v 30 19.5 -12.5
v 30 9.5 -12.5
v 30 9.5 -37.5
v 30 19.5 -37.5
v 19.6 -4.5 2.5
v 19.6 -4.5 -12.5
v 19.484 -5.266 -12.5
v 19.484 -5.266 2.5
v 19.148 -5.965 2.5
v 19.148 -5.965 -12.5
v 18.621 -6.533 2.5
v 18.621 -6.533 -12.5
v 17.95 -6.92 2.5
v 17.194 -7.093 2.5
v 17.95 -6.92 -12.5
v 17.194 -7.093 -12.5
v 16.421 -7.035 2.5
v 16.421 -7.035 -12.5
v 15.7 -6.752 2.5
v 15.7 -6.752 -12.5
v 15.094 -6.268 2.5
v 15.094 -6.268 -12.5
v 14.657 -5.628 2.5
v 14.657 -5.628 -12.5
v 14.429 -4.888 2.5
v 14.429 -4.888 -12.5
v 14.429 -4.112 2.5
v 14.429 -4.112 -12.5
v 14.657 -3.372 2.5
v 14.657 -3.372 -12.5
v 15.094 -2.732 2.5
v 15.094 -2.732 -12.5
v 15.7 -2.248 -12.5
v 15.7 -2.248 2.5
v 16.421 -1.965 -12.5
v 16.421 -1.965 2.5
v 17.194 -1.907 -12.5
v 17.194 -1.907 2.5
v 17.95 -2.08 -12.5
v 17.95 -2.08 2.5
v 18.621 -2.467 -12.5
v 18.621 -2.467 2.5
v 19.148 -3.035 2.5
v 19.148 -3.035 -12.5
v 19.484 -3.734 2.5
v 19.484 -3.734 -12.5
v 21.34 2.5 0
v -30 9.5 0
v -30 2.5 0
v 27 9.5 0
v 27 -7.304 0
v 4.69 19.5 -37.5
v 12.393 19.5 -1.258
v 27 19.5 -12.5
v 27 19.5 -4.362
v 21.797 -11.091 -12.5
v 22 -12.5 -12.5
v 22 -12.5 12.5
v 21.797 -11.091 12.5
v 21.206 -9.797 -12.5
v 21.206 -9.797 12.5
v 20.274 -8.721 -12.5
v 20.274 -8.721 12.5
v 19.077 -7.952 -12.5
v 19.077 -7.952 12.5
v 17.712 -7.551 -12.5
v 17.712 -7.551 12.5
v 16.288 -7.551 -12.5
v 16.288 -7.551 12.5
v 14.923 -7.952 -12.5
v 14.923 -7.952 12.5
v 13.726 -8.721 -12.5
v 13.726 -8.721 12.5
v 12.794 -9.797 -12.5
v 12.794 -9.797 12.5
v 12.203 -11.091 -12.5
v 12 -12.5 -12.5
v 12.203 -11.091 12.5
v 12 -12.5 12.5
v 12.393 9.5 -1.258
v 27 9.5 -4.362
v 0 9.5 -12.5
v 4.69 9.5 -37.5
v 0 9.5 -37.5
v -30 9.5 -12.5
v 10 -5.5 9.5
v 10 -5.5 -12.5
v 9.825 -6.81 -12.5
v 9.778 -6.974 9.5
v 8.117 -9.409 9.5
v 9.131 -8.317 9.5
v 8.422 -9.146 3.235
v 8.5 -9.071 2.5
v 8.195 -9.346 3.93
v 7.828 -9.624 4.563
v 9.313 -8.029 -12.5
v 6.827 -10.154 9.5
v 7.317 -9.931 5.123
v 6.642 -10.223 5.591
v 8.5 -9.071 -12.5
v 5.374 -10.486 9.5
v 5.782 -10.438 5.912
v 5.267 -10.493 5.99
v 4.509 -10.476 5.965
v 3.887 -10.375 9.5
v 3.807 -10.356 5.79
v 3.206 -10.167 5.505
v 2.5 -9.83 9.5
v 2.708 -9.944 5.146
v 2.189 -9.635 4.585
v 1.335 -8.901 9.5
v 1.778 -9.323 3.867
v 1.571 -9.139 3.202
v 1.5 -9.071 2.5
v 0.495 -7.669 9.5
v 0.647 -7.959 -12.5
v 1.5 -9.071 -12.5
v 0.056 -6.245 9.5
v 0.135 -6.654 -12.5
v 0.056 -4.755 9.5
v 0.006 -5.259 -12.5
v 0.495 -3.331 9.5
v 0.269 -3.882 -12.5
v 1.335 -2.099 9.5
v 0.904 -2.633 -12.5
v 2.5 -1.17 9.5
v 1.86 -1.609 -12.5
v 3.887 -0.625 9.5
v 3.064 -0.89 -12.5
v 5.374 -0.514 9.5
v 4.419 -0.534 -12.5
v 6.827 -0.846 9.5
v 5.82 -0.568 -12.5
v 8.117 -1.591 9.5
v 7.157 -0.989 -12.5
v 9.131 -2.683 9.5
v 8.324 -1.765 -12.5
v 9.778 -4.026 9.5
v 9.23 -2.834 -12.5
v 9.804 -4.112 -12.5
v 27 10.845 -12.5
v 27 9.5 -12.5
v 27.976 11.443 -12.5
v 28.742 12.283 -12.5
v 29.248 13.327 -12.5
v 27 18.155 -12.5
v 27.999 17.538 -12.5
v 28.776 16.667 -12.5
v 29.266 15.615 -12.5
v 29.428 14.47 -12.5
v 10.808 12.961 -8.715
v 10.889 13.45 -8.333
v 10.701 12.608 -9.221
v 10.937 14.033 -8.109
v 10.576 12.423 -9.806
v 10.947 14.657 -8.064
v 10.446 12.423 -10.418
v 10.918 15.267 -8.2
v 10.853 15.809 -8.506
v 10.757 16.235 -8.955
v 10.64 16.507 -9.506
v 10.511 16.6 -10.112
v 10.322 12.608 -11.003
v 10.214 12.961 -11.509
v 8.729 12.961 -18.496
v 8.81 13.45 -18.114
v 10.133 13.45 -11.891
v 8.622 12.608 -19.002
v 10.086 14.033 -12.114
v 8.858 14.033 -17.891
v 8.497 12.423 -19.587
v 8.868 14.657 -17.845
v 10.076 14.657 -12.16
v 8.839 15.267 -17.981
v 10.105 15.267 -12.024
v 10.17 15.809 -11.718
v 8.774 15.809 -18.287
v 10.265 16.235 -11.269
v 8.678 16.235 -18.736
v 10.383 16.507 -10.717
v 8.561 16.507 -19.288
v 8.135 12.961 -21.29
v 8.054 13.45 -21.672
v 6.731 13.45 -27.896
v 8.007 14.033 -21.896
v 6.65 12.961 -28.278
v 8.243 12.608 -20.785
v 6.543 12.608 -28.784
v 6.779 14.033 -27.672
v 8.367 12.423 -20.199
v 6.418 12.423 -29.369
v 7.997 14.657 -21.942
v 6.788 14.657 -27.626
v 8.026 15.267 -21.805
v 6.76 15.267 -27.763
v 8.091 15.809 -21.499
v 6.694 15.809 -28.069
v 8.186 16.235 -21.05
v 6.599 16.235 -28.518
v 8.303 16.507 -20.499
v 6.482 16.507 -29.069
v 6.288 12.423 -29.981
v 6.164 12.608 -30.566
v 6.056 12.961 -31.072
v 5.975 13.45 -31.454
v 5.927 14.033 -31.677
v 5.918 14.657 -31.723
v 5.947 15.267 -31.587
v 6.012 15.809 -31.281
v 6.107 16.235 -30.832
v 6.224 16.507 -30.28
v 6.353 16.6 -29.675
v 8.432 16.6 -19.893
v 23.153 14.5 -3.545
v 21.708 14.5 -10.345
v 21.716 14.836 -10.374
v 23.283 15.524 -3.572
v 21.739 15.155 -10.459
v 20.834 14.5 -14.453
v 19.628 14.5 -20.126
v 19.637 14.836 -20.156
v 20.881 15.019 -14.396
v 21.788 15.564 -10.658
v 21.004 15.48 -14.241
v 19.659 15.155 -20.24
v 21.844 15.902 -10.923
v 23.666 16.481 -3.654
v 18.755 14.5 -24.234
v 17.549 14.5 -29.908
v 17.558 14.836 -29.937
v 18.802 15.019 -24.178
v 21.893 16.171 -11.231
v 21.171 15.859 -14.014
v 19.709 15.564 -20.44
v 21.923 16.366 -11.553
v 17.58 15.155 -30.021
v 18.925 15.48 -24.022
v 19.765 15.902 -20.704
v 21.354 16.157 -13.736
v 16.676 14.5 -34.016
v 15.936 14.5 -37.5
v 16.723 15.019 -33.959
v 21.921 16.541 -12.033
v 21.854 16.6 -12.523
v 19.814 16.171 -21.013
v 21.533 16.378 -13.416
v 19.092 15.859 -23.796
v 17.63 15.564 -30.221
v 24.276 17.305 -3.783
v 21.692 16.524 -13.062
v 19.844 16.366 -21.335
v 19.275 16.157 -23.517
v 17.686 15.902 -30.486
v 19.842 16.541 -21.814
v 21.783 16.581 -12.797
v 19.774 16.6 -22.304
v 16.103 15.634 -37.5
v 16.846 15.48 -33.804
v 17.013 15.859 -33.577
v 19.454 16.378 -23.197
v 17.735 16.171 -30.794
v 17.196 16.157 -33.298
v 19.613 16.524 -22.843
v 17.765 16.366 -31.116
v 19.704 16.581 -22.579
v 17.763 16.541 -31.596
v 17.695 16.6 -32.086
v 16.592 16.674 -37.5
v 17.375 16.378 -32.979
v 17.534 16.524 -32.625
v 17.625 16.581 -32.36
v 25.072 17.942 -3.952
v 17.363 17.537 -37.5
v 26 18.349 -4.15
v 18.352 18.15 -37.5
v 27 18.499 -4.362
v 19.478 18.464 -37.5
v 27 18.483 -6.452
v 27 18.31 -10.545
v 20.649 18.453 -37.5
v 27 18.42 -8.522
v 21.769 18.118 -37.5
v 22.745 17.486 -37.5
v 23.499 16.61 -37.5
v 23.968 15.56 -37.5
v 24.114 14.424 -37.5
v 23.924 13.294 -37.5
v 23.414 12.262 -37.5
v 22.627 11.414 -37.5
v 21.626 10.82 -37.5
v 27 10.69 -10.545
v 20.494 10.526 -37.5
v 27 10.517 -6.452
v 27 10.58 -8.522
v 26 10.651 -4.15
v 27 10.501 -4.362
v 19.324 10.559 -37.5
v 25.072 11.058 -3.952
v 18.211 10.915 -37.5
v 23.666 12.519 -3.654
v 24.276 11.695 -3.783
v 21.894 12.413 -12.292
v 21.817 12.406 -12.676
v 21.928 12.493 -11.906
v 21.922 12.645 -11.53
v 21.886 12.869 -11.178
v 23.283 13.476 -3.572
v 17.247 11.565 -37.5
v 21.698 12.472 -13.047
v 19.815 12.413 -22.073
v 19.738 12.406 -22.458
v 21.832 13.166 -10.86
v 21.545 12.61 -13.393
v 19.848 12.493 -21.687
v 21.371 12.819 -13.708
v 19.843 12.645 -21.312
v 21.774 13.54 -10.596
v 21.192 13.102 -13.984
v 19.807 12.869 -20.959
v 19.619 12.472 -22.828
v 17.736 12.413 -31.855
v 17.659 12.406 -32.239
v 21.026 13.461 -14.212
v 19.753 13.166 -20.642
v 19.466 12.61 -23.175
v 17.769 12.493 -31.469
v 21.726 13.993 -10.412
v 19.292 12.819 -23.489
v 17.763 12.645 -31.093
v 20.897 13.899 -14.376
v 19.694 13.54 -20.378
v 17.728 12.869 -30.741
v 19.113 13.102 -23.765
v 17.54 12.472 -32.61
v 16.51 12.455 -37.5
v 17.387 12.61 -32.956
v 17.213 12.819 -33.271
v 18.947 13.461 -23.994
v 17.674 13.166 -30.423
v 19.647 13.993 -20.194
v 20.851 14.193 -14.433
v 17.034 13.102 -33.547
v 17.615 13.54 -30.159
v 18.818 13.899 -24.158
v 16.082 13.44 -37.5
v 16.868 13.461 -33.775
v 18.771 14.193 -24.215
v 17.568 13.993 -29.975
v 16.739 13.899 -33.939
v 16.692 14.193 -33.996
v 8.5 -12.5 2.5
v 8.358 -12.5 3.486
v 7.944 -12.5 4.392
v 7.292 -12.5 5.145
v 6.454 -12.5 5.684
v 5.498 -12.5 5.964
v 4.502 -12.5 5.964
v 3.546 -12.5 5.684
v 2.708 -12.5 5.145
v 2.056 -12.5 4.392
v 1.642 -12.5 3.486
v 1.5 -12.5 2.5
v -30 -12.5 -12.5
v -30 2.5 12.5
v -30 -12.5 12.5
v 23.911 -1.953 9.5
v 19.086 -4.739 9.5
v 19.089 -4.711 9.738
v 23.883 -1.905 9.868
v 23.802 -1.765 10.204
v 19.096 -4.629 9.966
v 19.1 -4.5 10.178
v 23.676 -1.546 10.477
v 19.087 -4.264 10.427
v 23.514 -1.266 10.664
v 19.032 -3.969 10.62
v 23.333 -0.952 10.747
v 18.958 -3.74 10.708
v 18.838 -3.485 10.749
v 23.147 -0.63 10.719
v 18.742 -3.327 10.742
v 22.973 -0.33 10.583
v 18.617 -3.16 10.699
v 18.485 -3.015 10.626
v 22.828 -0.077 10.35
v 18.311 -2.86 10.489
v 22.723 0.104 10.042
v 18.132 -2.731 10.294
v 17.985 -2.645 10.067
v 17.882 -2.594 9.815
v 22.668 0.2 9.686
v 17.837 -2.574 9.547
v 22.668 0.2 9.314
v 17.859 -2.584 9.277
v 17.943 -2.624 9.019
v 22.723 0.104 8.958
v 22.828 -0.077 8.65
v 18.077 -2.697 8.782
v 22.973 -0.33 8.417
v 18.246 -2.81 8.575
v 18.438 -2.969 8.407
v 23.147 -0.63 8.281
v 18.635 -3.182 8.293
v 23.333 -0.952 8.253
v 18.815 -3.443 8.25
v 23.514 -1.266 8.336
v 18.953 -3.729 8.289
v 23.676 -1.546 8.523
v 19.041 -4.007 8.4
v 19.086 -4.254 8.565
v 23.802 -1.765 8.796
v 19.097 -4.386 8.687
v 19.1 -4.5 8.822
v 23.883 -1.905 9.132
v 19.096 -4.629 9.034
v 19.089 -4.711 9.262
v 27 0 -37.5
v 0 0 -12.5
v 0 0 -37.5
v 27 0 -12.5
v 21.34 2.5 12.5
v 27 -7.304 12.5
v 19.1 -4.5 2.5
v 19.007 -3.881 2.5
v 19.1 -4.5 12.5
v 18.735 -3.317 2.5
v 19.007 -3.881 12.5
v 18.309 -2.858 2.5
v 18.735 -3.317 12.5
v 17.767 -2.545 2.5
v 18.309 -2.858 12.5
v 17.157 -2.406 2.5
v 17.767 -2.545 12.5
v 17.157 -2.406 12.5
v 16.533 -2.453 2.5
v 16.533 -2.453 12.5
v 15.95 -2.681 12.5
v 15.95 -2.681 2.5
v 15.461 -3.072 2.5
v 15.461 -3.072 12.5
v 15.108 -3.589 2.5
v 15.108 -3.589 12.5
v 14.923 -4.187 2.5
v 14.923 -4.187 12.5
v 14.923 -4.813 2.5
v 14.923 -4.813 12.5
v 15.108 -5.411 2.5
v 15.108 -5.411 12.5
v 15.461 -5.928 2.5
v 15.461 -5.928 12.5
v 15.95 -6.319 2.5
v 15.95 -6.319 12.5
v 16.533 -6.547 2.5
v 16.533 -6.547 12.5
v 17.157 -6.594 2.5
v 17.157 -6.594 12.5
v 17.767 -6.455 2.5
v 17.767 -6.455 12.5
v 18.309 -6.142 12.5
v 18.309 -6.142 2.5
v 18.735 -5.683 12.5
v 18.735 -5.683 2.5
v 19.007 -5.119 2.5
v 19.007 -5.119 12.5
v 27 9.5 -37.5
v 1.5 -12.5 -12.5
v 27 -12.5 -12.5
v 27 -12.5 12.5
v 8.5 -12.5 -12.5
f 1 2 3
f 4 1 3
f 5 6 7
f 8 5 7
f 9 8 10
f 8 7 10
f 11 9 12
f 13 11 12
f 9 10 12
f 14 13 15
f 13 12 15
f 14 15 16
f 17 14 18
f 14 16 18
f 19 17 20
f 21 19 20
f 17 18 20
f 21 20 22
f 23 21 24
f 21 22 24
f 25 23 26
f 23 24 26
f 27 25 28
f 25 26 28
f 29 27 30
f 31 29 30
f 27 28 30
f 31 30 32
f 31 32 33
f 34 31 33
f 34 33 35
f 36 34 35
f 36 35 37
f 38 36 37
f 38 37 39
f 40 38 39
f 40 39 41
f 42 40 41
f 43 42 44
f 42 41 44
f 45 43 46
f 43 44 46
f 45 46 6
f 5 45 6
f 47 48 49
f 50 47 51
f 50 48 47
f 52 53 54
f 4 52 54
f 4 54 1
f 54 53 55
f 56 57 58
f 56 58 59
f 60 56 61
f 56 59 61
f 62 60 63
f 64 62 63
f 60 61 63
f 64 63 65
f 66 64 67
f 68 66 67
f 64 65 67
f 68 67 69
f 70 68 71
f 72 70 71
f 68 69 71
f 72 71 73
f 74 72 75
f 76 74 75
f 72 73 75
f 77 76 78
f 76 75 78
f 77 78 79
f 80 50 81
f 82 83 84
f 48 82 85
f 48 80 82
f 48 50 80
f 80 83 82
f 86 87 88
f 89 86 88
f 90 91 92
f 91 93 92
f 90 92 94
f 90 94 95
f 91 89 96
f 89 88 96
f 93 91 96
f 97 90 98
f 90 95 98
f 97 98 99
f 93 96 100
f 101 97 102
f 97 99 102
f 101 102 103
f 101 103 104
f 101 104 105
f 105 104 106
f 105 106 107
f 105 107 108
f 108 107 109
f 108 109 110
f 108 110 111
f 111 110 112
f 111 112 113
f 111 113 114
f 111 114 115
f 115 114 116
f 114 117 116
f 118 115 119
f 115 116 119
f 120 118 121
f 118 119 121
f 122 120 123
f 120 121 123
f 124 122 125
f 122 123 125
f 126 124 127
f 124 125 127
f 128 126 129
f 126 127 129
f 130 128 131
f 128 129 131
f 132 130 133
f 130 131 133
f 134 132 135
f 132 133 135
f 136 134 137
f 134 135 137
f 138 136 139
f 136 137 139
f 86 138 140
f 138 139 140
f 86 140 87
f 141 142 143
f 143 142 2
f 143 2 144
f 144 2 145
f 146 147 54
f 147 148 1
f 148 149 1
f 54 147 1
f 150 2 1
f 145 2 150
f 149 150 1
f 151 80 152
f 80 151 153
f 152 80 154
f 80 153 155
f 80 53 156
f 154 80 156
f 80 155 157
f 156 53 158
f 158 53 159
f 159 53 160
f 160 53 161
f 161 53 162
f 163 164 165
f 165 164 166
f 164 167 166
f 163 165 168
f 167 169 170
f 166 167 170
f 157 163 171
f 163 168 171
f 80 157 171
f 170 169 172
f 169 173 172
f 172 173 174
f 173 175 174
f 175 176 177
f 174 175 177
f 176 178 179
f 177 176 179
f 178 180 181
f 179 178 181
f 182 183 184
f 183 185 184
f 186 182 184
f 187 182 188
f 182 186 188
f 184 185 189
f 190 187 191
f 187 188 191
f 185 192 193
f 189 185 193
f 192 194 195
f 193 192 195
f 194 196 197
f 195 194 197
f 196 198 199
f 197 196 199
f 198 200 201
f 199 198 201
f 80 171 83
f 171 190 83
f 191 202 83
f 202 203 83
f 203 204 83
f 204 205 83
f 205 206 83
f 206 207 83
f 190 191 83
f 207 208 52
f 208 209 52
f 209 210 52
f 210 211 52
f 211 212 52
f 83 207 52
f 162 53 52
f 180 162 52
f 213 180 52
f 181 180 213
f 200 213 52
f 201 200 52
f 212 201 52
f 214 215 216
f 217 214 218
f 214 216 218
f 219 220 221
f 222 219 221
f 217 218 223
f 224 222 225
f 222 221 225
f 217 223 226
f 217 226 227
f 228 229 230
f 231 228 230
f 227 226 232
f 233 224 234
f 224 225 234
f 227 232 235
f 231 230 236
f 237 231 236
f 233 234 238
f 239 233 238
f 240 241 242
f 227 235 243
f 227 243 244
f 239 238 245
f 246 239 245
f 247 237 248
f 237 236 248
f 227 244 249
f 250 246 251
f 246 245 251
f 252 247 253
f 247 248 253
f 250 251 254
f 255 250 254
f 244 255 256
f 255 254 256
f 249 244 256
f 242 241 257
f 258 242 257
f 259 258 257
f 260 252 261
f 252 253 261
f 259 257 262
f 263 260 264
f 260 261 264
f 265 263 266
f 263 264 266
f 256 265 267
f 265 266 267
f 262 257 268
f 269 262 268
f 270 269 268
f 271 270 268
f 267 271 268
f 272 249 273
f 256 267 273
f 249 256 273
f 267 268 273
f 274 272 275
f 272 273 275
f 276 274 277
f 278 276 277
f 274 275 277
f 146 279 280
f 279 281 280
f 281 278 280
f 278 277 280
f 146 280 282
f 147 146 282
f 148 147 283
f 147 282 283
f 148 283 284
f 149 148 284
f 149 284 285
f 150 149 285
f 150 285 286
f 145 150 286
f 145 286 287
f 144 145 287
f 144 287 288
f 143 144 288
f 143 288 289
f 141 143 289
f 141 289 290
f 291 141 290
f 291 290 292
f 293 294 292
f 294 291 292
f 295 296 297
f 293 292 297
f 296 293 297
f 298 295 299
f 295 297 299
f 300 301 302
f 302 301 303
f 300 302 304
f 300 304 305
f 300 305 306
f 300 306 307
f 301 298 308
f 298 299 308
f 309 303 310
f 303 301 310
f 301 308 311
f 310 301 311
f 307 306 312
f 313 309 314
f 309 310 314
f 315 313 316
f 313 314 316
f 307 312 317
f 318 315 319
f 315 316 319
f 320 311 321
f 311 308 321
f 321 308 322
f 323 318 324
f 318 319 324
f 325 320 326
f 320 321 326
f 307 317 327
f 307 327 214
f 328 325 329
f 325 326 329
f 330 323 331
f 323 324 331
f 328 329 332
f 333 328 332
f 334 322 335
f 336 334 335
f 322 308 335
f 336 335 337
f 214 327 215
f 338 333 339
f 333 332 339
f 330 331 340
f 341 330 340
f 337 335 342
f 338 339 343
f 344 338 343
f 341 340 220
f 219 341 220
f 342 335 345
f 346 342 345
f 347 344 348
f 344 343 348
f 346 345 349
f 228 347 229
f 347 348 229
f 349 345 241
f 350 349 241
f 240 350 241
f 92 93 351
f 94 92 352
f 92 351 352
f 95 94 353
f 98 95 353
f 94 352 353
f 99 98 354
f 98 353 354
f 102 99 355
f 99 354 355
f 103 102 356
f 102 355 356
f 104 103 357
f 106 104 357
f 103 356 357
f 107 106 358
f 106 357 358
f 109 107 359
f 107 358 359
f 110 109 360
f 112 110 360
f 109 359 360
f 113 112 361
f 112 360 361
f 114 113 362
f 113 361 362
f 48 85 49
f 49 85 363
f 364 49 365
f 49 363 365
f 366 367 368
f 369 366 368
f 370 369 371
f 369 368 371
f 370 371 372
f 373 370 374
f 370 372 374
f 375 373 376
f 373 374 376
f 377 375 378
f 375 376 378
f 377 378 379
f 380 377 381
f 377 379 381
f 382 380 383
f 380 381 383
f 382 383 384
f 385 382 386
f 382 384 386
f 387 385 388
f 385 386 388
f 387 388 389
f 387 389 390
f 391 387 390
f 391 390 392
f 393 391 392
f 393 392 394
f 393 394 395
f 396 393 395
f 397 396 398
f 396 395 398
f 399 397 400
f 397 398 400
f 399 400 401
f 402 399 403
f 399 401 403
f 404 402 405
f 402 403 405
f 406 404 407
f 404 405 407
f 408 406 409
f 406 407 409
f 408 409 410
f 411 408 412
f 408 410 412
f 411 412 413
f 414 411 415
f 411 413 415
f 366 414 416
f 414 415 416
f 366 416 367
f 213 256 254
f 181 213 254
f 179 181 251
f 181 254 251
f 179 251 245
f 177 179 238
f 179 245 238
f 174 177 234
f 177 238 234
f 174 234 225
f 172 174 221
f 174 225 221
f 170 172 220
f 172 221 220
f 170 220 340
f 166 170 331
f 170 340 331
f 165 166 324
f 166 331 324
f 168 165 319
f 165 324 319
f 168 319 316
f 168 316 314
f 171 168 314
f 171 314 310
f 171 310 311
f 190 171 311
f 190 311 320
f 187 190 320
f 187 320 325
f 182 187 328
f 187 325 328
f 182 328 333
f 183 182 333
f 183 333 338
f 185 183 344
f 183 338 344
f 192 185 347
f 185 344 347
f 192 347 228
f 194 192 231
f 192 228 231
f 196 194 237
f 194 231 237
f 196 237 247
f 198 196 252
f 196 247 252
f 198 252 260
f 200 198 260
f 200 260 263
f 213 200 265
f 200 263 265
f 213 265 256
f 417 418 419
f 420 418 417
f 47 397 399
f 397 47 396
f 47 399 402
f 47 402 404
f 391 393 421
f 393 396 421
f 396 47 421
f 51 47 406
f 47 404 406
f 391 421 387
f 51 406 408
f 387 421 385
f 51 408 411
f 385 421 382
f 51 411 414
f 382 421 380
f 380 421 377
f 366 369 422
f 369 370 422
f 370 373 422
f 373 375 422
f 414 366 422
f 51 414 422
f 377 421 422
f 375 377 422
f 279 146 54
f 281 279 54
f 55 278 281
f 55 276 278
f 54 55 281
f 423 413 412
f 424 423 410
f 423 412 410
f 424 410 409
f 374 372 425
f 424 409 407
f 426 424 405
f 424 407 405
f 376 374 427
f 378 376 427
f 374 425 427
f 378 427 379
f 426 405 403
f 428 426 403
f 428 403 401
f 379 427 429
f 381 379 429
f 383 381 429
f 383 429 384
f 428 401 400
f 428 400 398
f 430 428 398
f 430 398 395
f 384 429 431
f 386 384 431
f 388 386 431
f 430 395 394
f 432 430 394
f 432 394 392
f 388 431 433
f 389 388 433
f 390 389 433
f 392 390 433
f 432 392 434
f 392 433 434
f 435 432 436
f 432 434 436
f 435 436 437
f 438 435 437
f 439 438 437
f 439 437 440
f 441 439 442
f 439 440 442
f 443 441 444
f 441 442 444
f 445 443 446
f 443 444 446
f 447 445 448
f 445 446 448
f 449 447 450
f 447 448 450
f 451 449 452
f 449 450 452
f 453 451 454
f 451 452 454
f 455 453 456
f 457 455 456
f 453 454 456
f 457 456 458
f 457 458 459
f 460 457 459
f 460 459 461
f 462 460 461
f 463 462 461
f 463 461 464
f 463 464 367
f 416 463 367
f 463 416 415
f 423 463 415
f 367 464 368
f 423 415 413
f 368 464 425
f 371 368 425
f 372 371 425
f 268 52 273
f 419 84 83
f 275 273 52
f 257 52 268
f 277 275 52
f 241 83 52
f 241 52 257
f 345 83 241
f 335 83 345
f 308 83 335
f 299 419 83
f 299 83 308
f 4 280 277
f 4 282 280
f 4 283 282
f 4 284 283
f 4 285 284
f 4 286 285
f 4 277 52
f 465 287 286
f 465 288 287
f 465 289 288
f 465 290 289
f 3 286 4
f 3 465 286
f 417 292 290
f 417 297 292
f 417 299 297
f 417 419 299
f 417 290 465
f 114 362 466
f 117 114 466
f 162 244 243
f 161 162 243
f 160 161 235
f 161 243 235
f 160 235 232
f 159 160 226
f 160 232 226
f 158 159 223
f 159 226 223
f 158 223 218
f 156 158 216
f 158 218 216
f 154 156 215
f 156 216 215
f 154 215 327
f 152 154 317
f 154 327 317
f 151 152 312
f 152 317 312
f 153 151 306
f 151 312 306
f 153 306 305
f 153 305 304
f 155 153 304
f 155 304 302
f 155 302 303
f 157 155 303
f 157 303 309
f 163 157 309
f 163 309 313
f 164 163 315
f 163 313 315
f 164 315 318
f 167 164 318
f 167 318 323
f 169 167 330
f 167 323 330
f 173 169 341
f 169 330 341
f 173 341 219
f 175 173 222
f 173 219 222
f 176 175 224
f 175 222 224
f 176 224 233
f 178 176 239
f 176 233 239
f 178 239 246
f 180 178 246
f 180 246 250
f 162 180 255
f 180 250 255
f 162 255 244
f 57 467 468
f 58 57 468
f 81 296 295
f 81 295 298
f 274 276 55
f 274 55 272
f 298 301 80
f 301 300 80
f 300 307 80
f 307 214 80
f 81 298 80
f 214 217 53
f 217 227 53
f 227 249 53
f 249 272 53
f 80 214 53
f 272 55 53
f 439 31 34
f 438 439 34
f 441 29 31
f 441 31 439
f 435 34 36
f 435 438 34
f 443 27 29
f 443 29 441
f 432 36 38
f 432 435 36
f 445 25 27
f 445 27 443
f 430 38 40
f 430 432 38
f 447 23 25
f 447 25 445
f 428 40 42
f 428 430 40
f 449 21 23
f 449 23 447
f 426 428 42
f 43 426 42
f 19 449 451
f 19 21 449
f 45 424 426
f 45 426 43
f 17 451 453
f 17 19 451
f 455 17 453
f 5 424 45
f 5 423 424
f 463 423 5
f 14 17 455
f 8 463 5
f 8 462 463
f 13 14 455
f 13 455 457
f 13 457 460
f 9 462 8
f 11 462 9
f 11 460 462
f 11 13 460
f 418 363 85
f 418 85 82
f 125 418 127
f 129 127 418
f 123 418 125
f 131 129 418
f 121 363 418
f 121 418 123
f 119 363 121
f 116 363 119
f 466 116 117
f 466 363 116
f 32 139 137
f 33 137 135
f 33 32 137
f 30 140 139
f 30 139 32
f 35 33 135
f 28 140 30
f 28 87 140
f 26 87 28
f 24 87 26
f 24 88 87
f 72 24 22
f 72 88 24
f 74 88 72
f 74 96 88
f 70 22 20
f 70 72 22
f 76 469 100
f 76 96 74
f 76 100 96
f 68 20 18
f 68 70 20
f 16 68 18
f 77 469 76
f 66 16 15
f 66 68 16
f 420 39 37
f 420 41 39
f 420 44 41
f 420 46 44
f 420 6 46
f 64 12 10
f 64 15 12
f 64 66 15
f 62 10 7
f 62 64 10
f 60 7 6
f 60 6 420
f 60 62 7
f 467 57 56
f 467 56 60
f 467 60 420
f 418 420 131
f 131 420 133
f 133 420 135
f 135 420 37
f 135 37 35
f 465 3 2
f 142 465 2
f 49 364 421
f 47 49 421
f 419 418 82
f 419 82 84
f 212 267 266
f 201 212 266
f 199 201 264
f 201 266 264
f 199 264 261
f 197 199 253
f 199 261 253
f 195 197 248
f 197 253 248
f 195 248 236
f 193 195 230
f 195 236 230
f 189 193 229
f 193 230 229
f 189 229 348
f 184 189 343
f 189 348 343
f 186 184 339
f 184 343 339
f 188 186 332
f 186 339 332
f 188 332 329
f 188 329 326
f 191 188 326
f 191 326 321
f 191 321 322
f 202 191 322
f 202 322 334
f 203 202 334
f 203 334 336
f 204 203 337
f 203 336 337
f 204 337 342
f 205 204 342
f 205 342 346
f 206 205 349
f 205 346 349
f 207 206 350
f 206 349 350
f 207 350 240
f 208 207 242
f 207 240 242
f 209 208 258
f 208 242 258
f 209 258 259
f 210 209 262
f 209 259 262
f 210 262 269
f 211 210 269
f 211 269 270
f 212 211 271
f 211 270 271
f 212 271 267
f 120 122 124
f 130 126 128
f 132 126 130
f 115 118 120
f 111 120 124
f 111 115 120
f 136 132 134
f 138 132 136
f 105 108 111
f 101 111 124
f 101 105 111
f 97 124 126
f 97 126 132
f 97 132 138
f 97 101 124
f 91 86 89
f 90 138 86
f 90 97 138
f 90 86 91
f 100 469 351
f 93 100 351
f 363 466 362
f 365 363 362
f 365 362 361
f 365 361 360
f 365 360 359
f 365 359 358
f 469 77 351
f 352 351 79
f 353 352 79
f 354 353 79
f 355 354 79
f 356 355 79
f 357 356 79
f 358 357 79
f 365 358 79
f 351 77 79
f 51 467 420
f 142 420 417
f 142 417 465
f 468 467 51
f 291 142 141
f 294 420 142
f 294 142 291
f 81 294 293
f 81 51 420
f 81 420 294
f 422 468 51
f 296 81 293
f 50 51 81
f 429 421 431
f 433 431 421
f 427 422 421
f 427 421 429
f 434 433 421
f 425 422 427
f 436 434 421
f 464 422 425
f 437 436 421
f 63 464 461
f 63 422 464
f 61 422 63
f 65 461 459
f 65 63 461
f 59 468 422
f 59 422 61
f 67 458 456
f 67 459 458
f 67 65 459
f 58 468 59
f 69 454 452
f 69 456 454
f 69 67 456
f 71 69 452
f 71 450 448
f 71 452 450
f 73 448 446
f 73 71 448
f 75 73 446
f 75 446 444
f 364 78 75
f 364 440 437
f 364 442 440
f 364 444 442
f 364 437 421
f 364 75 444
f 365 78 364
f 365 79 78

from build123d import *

# Parameters (mm, degrees)
F0_W      = 25
F0_H      = 25
F1_DEPTH  = 30
F3_DEPTH  = 25.001
F4_R      = 2.1
F5_DEPTH  = 25.001
F6_R      = 5
F7_DEPTH  = 22
F9_DEPTH  = 7
F10_R     = 2.6
F11_DEPTH = 15
F14_W     = 30
F14_H     = 12.5
F15_DEPTH = 25
F16_DEPTH = 7
F18_DEPTH = 10
F20_DEPTH = 10
F22_D     = 8
F24_DEPTH = 12.5
F25_W     = 9.5
F25_H     = 25
F26_DEPTH = 3
F28_D     = 4.2
F28_DEPTH = 15
F28_TIP   = 1.2618073
F31_D     = 2.5
F31_DEPTH = 8
F31_TIP   = 0.7510757738


with BuildPart() as f1:
    # F0 (on Right) → F1 (new body, symmetric)
    with BuildSketch(Plane.YZ):
        Rectangle(F0_W, F0_H)
    extrude(amount=F1_DEPTH, both=True)

    # F2 (on face) → F3 (cut, through all)
    with BuildSketch(Plane.XY.offset(12.5)):
        with BuildLine():
            Line((12, -12.5), (22, -12.5))
            ThreePointArc((22, -12.5), (17, -7.5), (12, -12.5))
        make_face()
    extrude(amount=-F3_DEPTH, mode=Mode.SUBTRACT)

    # F4 (on face) → F5 (cut, through all)
    with BuildSketch(Plane.XY.offset(12.5)):
        with Locations((17, -4.5)):
            Circle(F4_R)
    extrude(amount=-F5_DEPTH, mode=Mode.SUBTRACT)

    # F6 (on face) → F7 (cut)
    with BuildSketch(Plane(origin=(0, 0, -12.5), x_dir=(1, 0, 0), z_dir=(0, 0, -1))):
        with Locations((5, 5.5)):
            Circle(F6_R)
    extrude(amount=-F7_DEPTH, mode=Mode.SUBTRACT)

    # F8 (on face) → F9 (cut)
    with BuildSketch(Plane.XZ.offset(12.5)):
        with BuildLine():
            Line((1.5, -12.5), (8.5, -12.5))
            Line((8.5, -12.5), (8.5, 2.5))
            ThreePointArc((8.5, 2.5), (5, 6), (1.5, 2.5))
            Line((1.5, 2.5), (1.5, -12.5))
        make_face()
    extrude(amount=-F9_DEPTH, mode=Mode.SUBTRACT)

    # F10 (on face) → F11 (cut)
    with BuildSketch(Plane(origin=(0, 0, -12.5), x_dir=(1, 0, 0), z_dir=(0, 0, -1))):
        with Locations((17, 4.5)):
            Circle(F10_R)
    extrude(amount=-F11_DEPTH, mode=Mode.SUBTRACT)


with BuildPart() as f12_1:
    # F12: copy of F1
    add(f1.part)


with BuildPart() as f1_1:
    add(f1.part)

    # F14 (on face) → F15 (join)
    with BuildSketch(Plane(origin=(0, 0, -12.5), x_dir=(1, 0, 0), z_dir=(0, 0, -1))):
        with Locations((15, -6.25)):
            Rectangle(F14_W, F14_H)
    extrude(amount=F15_DEPTH)

    # F16 (add): a face of the model
    f16_faces = [f1_1.faces().sort_by_distance(p)[0] for p in [
        (5, 12.5, -8.3333333333),
    ]]
    extrude(f16_faces, amount=F16_DEPTH)

    # F17 (on face) → F18 (cut)
    with BuildSketch(Plane(origin=(0, 19.5, 0), x_dir=(-1, 0, 0), z_dir=(0, 1, 0))):
        Polygon((-30, -5), (-6.4768494526, 0), (30, 0), (30, 12.5), (-30, 12.5), align=None)
    extrude(amount=-F18_DEPTH, mode=Mode.SUBTRACT)

    # F19 (on face) → F20 (cut)
    with BuildSketch(Plane(origin=(0, 19.5, 0), x_dir=(-1, 0, 0), z_dir=(0, 1, 0))):
        Polygon((30, -1.2575895653), (-12.3933431868, -1.2575895653), (-4.6897810382, -37.5), (0, -37.5), (0, -12.5), (30, -12.5), align=None)
        Polygon((-12.3933431868, 5.6717685307), (-12.3933431868, -1.2575895653), (-6.4768494526, 0), (30, 0), (30, 5.6717685307), align=None)
        Polygon((-6.4768494526, 0), (-12.3933431868, -1.2575895653), (30, -1.2575895653), (30, 0), align=None)
    extrude(amount=-F20_DEPTH, mode=Mode.SUBTRACT)

    # F22 (through all)
    with Locations(Plane(origin=(0.2799765277, 0, 1.317186002), x_dir=(0.9781476007, 0, -0.2079116908), z_dir=(0.2079116908, 0, 0.9781476007))):
        with Locations((27.3839864761, 14.5)):
            Hole(F22_D / 2)

    # F23 (on face) → F24 (cut)
    with BuildSketch(Plane.XY.offset(12.5)):
        Polygon((21.3397459622, 2.5), (30, -12.5), (30, 9.5), (17.2982940778, 9.5), align=None)
        Polygon((-30, 2.5), (21.3397459622, 2.5), (17.2982940778, 9.5), (-30, 9.5), align=None)
    extrude(amount=-F24_DEPTH, mode=Mode.SUBTRACT)

    # F25 (on face) → F26 (cut)
    with BuildSketch(Plane.YZ.offset(30)):
        with BuildLine():
            Line((-12.5, 0), (-12.5, -12.5))
            Line((-12.5, -12.5), (0, -12.5))
            Line((0, -12.5), (9.5, -12.5))
            Line((9.5, -12.5), (19.5, -12.5))
            Line((19.5, -12.5), (19.5, -5))
            Line((19.5, -5), (17.1457513111, -5))
            add(Edge.make_bspline(
                [(14.5, -9.8097343447), (16.011857892, -9.8097343447), (17.1457513111, -5)],
                knots=[3.1415926536, 3.1415926536, 3.1415926536, 3.8643269014, 3.8643269014, 3.8643269014], degree=2, weights=[1, 0.9354143467, 1]))
            add(Edge.make_bspline(
                [(11.8542486889, -5), (12.988142108, -9.8097343447), (14.5, -9.8097343447)],
                knots=[2.4188584058, 2.4188584058, 2.4188584058, 3.1415926536, 3.1415926536, 3.1415926536], degree=2, weights=[1, 0.9354143467, 1]))
            Line((11.8542486889, -5), (9.5, -5))
            Line((9.5, -5), (9.5, 0))
            Line((9.5, 0), (-12.5, 0))
        make_face()
        with BuildLine():
            Line((-12.5, 12.5), (-12.5, 0))
            Line((-12.5, 0), (9.5, 0))
            Line((9.5, 0), (9.5, -5))
            Line((9.5, -5), (11.8542486889, -5))
            add(Edge.make_bspline(
                [(11.8542486889, -5), (12.988142108, -9.8097343447), (14.5, -9.8097343447)],
                knots=[2.4188584058, 2.4188584058, 2.4188584058, 3.1415926536, 3.1415926536, 3.1415926536], degree=2, weights=[1, 0.9354143467, 1]))
            add(Edge.make_bspline(
                [(14.5, -9.8097343447), (16.011857892, -9.8097343447), (17.1457513111, -5)],
                knots=[3.1415926536, 3.1415926536, 3.1415926536, 3.8643269014, 3.8643269014, 3.8643269014], degree=2, weights=[1, 0.9354143467, 1]))
            Line((17.1457513111, -5), (19.5, -5))
            Line((19.5, -5), (19.5, 12.5))
            Line((19.5, 12.5), (-12.5, 12.5))
        make_face()
        with Locations((4.75, -25)):
            Rectangle(F25_W, F25_H)
    extrude(amount=-F26_DEPTH, mode=Mode.SUBTRACT)

    # F28
    with Locations(Plane(origin=(12.1133666591, 0, -2.5747755673), x_dir=(0, -1, 0), z_dir=(-0.9781476007, 0, 0.2079116908))):
        with Locations((-14.5, -7.7054747223), (-14.5, -17.7054747223), (-14.5, -27.7054747223)):
            Hole(F28_D / 2, depth=F28_DEPTH)
            with Locations((0, 0, -(F28_DEPTH + F28_TIP / 2))):  # 118° drill point
                Cone(0, F28_D / 2, F28_TIP, mode=Mode.SUBTRACT)

    # F31
    with Locations(Plane(origin=(17.0873412263, 9.8653810568, 0), x_dir=(-0.5, 0.8660254038, 0), z_dir=(0.8660254038, 0.5, 0))):
        with Locations((-12.397114317, 9.5)):
            Hole(F31_D / 2, depth=F31_DEPTH)
            with Locations((0, 0, -(F31_DEPTH + F31_TIP / 2))):  # 118° drill point
                Cone(0, F31_D / 2, F31_TIP, mode=Mode.SUBTRACT)


solid = f1_1.part
